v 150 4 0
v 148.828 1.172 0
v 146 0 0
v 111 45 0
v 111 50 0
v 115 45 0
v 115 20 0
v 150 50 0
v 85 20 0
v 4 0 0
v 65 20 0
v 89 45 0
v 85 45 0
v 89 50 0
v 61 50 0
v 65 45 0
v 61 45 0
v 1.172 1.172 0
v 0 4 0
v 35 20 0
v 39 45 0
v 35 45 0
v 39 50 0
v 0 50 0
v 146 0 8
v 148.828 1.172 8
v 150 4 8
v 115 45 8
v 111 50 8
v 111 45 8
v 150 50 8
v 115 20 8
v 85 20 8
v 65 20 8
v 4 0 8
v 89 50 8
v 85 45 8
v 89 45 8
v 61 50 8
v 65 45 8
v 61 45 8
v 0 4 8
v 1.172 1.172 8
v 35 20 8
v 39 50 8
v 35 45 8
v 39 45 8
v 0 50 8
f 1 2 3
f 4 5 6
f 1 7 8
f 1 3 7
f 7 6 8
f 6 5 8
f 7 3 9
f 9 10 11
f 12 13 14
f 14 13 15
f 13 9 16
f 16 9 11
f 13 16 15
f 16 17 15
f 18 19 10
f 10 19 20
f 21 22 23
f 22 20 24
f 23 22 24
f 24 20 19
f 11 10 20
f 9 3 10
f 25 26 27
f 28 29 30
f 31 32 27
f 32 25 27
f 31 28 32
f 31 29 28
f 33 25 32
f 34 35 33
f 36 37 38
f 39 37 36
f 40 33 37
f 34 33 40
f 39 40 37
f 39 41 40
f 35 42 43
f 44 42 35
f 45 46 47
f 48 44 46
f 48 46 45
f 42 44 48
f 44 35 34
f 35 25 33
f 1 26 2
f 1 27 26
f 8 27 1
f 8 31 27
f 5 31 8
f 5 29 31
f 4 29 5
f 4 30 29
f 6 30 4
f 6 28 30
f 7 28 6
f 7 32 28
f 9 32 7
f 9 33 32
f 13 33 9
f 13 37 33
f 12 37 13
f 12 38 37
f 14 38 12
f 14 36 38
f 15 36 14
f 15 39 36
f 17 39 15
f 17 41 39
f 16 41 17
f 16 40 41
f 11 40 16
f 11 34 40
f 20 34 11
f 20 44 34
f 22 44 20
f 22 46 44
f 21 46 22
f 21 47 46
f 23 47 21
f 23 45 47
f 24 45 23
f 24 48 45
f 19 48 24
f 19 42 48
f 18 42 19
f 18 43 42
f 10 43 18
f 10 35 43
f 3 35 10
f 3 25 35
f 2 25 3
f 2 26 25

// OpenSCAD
$fn = 32;

// ----------------------------------------------------------------------
// Oversize slot bar: 150 mm bar with 2 oversize windows
// ----------------------------------------------------------------------

// --- parameters (mm) ---
profile_height = 8;       // extrusion height
profile_points = 24;      // points of the closed outline

profile = [[0, 4], [1.172, 1.172], [4, 0], [146, 0], [148.828, 1.172], [150, 4], [150, 50], [111, 50], [111, 45], [115, 45], [115, 20], [85, 20], [85, 45], [89, 45], [89, 50], [61, 50], [61, 45], [65, 45], [65, 20], [35, 20], [35, 45], [39, 45], [39, 50], [0, 50]];  // single closed polygon, 24 points, counter clockwise

// --- the one profile operation ---
linear_extrude(height = profile_height) polygon(points = profile);
